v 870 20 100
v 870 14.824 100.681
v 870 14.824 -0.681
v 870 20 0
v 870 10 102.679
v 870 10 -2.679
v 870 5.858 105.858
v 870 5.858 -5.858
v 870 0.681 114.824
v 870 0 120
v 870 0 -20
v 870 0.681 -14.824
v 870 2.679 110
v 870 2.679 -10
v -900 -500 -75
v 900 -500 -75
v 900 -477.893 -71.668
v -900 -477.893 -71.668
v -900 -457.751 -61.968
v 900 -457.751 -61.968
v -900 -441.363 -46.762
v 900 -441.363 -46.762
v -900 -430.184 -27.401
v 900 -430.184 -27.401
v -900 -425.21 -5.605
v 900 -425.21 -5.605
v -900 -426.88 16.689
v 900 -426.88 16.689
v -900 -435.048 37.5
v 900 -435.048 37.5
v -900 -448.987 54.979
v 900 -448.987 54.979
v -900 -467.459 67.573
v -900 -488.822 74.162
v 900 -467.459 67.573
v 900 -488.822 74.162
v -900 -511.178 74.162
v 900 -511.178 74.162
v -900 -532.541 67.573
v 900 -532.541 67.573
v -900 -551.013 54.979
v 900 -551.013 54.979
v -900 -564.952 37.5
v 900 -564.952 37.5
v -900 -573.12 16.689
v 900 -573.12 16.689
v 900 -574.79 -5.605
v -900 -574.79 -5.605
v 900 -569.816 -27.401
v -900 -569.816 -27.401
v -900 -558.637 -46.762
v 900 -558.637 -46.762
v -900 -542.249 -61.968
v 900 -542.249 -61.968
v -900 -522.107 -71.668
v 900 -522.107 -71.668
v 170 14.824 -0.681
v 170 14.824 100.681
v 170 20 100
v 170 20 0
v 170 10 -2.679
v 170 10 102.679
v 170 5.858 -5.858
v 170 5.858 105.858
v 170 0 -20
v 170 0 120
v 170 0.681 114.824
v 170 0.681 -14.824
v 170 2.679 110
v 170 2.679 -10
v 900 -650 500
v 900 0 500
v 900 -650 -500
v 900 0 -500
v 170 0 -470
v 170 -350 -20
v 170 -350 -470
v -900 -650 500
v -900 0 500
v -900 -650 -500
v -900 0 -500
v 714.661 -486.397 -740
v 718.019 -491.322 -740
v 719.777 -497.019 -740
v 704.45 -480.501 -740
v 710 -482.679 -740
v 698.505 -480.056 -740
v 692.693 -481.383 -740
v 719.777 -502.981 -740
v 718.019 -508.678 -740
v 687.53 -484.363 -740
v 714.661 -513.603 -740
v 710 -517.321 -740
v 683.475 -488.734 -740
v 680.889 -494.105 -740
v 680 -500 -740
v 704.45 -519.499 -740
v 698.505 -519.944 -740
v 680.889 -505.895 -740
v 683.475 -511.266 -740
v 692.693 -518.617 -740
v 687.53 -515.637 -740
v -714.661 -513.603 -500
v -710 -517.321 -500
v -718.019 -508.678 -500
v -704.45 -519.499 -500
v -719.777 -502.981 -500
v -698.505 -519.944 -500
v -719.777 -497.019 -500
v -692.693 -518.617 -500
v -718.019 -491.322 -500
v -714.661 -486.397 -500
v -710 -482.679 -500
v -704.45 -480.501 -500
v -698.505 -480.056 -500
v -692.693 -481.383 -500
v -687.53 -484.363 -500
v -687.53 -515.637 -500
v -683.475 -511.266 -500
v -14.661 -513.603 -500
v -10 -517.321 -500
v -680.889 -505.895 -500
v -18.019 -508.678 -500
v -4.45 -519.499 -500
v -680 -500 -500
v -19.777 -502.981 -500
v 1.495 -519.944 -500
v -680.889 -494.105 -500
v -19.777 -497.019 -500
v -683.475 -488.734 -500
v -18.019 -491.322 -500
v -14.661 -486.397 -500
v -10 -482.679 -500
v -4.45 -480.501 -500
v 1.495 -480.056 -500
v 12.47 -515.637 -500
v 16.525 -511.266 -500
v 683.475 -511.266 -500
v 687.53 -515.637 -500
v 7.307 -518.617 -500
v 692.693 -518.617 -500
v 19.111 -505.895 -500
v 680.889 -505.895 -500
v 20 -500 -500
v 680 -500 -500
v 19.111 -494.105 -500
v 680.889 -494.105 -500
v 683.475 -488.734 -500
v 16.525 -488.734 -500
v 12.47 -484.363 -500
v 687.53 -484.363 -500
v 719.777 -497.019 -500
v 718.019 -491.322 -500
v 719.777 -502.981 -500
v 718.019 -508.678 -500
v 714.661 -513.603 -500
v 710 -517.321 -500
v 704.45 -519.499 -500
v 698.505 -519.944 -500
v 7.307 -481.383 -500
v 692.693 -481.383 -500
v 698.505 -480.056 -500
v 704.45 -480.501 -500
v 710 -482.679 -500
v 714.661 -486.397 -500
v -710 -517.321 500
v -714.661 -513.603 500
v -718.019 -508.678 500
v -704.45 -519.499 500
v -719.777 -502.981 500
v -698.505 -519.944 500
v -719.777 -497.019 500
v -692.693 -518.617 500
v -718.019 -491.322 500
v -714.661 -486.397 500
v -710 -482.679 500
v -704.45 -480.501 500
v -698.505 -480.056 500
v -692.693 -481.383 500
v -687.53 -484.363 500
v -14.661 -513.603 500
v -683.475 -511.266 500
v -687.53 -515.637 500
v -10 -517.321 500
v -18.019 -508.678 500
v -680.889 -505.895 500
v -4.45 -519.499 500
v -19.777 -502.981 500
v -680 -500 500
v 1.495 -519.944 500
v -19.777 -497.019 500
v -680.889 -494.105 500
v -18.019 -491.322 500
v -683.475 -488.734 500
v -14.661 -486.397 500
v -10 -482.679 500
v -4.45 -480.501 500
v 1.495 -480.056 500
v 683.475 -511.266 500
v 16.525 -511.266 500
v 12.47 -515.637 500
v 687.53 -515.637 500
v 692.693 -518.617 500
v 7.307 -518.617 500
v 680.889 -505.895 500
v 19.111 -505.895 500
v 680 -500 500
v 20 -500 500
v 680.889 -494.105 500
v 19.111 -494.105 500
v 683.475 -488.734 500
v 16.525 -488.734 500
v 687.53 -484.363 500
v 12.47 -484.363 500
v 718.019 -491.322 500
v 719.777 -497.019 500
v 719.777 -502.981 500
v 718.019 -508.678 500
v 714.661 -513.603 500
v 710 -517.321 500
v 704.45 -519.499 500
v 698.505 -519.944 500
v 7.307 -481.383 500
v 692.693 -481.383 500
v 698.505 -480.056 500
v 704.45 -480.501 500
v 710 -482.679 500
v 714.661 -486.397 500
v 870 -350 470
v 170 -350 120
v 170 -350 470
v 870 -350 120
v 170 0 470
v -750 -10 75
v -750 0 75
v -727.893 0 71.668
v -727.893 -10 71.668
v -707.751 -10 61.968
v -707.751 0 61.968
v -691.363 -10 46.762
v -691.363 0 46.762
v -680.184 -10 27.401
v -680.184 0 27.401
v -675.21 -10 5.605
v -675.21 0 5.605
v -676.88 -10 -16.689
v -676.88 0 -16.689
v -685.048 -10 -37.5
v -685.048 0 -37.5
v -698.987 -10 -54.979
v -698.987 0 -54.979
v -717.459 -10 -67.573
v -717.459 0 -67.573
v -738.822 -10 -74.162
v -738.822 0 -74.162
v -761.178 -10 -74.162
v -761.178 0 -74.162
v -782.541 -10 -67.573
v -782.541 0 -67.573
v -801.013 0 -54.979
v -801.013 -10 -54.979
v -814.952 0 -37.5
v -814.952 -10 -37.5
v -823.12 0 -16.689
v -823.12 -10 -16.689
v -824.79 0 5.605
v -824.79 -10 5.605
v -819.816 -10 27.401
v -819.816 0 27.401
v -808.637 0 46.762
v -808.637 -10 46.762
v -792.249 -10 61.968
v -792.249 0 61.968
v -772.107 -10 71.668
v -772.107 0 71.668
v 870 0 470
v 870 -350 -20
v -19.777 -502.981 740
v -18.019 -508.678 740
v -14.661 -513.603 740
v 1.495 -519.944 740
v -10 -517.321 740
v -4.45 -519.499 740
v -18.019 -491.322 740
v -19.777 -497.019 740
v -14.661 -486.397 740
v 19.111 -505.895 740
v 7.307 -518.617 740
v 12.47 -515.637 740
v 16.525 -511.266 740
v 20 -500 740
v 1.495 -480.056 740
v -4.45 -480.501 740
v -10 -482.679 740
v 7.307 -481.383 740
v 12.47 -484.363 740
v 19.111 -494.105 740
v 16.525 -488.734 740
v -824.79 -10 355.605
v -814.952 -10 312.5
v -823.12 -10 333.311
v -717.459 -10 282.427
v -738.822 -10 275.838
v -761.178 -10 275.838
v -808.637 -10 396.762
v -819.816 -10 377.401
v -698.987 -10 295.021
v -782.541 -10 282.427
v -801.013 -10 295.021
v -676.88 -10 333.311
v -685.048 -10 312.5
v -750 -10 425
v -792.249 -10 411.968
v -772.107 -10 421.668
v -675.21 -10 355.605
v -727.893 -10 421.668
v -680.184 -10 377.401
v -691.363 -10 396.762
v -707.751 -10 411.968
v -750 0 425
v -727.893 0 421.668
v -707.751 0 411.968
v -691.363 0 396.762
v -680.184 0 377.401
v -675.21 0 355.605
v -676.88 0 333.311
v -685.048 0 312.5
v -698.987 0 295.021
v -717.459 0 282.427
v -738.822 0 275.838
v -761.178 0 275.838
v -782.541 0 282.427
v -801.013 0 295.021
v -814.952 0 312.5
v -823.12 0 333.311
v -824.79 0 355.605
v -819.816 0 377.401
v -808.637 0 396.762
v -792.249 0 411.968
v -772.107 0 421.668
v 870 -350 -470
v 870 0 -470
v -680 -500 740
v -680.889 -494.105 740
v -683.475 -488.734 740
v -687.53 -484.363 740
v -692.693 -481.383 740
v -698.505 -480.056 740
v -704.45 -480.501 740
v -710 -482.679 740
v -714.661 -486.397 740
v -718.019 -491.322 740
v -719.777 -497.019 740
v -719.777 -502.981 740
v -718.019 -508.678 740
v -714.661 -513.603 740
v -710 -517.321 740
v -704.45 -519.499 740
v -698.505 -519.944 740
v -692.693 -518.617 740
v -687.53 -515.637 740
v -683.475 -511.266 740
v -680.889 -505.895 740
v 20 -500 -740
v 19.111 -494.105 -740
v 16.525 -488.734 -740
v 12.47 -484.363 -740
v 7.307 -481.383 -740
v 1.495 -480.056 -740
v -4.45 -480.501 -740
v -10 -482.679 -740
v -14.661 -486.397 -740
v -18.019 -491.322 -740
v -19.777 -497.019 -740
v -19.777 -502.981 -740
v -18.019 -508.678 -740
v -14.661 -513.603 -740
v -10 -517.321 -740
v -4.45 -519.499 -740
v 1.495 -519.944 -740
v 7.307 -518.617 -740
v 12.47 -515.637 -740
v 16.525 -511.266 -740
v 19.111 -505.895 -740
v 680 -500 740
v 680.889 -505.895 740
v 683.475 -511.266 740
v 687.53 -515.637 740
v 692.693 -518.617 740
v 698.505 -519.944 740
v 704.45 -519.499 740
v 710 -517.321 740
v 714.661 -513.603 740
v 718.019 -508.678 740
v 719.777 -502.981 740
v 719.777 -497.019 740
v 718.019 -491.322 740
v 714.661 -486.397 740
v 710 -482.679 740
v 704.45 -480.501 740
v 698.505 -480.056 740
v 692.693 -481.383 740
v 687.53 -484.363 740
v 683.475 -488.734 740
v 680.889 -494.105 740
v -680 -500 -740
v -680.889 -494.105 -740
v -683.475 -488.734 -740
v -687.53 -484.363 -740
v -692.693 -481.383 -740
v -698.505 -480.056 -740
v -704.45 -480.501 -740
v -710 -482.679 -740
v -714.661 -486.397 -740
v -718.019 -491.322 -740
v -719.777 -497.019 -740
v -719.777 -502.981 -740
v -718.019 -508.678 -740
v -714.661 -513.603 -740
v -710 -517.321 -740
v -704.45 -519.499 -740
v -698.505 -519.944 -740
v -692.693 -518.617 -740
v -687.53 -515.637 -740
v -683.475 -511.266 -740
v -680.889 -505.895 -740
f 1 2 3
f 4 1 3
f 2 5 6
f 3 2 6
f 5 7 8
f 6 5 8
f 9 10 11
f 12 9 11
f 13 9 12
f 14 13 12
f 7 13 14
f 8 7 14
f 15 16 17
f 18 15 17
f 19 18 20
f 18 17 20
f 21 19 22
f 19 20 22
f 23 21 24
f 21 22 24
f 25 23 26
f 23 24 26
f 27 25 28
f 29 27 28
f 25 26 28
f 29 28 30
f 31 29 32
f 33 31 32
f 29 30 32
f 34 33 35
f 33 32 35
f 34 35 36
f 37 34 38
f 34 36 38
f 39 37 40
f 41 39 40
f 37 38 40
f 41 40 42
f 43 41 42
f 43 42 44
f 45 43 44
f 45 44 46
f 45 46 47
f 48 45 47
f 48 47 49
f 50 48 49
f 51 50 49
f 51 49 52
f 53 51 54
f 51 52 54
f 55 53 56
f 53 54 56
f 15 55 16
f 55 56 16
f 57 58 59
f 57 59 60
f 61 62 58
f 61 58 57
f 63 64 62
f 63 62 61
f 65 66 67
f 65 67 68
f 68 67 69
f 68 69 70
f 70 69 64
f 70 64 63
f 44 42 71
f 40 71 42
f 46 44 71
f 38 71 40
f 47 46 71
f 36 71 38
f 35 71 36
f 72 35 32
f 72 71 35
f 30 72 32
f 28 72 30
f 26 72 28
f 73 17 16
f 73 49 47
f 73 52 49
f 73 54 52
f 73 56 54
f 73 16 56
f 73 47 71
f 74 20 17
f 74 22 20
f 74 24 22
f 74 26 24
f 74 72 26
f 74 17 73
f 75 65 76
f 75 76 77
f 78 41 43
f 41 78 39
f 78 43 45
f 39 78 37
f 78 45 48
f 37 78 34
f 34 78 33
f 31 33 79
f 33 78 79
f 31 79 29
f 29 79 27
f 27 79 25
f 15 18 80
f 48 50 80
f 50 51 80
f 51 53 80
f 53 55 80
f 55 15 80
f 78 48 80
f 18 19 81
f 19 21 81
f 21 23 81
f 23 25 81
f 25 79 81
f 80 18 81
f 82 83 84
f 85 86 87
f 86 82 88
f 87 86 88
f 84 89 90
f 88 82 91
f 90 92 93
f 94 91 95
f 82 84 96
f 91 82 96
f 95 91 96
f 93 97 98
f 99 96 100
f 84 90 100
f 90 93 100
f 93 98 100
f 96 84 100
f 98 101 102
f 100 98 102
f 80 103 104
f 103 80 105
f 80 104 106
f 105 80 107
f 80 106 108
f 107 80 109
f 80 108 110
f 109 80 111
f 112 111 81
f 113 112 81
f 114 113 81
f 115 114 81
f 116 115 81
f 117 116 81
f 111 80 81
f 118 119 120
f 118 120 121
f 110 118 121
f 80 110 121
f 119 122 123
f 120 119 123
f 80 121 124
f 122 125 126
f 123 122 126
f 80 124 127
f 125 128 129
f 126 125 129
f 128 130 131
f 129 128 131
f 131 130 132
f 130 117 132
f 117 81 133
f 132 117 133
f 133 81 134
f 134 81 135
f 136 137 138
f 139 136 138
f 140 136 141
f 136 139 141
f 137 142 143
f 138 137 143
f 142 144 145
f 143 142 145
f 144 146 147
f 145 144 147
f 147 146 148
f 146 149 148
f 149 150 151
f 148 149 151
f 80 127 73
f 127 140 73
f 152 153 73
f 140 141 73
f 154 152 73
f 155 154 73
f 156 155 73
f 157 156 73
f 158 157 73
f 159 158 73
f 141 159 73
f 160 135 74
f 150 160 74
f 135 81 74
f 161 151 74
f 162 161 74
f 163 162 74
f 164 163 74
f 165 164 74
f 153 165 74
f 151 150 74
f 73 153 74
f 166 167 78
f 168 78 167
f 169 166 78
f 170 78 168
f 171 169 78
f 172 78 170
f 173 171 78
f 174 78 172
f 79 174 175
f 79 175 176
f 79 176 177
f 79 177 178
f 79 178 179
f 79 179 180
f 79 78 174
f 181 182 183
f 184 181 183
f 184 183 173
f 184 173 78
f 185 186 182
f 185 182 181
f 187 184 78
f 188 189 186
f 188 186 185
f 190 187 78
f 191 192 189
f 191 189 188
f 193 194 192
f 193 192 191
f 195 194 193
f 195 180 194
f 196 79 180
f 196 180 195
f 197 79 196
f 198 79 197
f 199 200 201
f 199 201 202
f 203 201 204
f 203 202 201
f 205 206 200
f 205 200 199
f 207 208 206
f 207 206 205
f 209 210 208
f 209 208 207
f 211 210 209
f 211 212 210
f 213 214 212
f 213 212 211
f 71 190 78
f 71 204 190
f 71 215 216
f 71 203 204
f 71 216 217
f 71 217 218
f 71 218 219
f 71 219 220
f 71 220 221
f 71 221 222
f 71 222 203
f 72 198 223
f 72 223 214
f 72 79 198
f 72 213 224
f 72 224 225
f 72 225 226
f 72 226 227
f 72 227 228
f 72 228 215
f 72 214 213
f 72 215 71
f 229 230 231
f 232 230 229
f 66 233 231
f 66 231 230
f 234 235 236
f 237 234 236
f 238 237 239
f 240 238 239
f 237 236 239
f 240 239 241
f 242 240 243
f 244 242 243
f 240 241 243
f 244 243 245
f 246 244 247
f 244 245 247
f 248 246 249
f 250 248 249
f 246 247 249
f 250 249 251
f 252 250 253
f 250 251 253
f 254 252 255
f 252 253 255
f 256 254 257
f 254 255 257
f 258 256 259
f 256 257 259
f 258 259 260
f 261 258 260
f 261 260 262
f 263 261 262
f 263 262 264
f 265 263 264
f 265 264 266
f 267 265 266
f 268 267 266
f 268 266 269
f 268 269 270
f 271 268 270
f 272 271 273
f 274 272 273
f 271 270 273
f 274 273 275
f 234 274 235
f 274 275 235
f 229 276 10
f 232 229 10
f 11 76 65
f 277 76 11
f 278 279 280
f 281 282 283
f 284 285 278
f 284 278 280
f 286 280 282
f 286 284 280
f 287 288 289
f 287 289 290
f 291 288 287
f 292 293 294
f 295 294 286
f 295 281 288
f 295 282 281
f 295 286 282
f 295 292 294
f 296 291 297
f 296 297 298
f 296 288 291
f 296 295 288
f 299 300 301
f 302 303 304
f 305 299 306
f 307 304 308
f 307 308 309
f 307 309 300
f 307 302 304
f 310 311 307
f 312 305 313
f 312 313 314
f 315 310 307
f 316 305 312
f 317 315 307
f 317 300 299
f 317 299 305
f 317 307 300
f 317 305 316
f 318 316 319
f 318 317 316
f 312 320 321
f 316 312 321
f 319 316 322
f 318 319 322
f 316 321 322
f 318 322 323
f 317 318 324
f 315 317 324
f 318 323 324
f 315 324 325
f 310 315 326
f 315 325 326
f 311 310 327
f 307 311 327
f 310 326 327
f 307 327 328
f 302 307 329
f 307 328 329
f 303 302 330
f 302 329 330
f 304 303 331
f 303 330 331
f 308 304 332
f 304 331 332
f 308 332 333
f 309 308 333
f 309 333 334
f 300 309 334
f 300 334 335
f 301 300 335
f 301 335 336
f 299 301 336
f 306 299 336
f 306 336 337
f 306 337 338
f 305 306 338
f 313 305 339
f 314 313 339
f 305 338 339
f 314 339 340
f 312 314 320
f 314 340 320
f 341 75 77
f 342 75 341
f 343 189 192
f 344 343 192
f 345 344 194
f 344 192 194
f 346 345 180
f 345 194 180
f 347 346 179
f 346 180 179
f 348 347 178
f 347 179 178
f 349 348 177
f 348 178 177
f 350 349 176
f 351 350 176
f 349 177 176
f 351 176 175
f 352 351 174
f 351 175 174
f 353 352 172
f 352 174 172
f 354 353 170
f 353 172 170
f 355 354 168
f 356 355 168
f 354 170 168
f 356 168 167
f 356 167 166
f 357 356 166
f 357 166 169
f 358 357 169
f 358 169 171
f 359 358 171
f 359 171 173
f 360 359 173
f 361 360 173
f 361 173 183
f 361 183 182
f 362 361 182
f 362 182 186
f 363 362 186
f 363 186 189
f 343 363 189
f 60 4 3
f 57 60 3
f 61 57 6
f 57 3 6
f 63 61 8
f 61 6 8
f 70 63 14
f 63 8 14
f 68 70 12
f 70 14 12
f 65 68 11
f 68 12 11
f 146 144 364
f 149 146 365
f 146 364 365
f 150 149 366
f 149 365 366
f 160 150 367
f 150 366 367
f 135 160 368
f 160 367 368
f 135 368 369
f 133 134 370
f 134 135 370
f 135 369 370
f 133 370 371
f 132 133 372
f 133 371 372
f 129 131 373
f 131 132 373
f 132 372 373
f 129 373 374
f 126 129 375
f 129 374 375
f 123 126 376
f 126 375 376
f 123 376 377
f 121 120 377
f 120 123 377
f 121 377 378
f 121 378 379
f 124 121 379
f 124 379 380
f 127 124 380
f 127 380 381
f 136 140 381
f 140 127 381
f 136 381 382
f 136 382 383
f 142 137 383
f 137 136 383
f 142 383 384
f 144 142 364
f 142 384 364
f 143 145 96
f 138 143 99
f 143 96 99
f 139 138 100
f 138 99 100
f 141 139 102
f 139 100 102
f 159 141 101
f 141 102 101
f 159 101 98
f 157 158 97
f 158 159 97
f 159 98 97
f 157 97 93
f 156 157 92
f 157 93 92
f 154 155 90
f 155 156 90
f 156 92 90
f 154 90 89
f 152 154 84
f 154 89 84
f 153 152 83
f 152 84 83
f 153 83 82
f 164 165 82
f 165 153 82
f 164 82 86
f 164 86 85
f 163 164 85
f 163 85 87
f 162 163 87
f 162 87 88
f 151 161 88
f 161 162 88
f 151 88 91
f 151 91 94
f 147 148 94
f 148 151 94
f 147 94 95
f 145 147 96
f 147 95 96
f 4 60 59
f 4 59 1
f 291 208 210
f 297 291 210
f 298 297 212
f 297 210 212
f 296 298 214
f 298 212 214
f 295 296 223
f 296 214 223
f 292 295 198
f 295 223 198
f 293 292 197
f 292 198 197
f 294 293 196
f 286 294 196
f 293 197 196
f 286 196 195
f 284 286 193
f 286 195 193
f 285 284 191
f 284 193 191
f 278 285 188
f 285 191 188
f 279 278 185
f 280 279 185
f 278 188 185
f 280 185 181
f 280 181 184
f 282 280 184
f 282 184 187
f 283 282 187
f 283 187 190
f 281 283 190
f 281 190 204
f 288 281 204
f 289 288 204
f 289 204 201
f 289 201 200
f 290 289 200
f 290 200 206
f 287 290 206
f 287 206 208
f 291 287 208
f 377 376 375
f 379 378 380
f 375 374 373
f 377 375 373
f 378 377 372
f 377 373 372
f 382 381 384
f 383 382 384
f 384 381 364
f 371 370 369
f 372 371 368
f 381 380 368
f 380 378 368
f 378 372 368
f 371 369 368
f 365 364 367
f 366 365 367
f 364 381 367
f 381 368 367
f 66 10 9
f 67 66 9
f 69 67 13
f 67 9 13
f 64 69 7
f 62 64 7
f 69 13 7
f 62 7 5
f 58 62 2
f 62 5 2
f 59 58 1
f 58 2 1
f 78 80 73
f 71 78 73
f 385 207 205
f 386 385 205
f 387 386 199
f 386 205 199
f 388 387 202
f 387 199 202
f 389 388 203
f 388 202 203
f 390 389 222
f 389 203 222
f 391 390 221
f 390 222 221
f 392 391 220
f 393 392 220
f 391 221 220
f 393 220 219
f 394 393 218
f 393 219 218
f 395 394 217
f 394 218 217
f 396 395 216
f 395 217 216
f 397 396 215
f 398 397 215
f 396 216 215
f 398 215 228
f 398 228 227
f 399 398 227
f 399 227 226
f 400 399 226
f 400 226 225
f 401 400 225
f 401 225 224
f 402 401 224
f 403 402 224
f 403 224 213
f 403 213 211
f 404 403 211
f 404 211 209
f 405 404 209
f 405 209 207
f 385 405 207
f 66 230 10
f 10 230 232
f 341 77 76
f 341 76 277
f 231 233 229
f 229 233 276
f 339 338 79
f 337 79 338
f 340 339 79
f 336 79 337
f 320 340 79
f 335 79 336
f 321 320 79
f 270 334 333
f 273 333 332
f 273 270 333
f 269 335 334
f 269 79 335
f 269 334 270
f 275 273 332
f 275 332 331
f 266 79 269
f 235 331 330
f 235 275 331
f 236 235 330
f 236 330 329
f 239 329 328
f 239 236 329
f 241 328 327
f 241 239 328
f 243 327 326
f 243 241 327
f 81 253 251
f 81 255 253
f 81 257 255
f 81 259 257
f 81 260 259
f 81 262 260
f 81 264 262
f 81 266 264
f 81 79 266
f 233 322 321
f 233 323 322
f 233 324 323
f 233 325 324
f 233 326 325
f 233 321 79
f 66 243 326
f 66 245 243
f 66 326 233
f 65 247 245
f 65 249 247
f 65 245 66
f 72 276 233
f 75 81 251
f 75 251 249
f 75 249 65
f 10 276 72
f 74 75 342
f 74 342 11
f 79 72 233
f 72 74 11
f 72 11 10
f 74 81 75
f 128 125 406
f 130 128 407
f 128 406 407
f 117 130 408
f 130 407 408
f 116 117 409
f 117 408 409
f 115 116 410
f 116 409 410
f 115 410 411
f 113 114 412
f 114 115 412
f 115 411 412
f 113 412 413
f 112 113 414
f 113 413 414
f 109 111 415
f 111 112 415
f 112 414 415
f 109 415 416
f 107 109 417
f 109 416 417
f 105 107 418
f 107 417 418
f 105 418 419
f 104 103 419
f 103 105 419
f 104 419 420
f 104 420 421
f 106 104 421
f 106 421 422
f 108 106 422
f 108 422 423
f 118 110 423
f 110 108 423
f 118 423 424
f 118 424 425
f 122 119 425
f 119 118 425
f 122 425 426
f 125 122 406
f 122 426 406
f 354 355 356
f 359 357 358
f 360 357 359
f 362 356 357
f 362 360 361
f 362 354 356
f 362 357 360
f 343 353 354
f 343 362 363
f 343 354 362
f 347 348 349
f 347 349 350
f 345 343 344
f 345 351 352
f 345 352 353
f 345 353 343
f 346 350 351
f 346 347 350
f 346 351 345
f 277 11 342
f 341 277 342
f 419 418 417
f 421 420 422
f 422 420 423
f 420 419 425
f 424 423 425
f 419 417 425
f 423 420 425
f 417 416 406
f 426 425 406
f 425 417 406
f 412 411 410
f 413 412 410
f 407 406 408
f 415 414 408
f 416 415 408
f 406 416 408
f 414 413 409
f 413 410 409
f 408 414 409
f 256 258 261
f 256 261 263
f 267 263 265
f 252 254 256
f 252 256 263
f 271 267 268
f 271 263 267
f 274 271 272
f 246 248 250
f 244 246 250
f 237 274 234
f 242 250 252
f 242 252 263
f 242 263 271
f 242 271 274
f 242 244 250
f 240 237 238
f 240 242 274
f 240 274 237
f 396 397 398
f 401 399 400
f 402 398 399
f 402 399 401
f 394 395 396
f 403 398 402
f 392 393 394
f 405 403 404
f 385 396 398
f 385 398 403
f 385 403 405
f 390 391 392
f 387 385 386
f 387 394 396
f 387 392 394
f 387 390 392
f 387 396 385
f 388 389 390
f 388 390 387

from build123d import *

# Parameters (mm, degrees)
SKIZZE1_W                            = 1800
SKIZZE1_H                            = 1000
AUFSATZ_LINEAR_AUSTRAGEN1_DEPTH      = 650
AUFSATZ_LINEAR_AUSTRAGEN2_DEPTH      = 740
AUFSATZ_LINEAR_AUSTRAGEN2_DEPTH_BACK = 740
SKIZZE2_R                            = 20
SKIZZE3_W                            = 700
SKIZZE3_H                            = 450
SKIZZE3_H_2                          = 350
SCHNITT_LINEAR_AUSTRAGEN1_DEPTH      = 350
SKIZZE4_W                            = 700
SKIZZE4_H                            = 140
AUFSATZ_LINEAR_AUSTRAGEN3_DEPTH      = 20
SKIZZE5_R                            = 20
SCHNITT_LINEAR_AUSTRAGEN2_DEPTH      = 700
SKIZZE6_R                            = 75
SCHNITT_LINEAR_AUSTRAGEN3_DEPTH      = 1800
SKIZZE7_R                            = 75
SCHNITT_LINEAR_AUSTRAGEN4_DEPTH      = 10
SKIZZE8_R                            = 75
SCHNITT_LINEAR_AUSTRAGEN5_DEPTH      = 10


with BuildPart() as part:
    # Skizze1 → Aufsatz-Linear austragen1 (new body)
    with BuildSketch(Plane(origin=(0, 0, 0), x_dir=(1, 0, 0), z_dir=(0, 1, 0))):
        Rectangle(SKIZZE1_W, SKIZZE1_H)
    extrude(amount=-AUFSATZ_LINEAR_AUSTRAGEN1_DEPTH)

    # Skizze2 → Aufsatz-Linear austragen2 (add, two sides: drawn at the far end of the back side and taken through both)
    with BuildSketch(Plane.XY.offset(-AUFSATZ_LINEAR_AUSTRAGEN2_DEPTH_BACK)):
        with Locations((0, -500)):
            Circle(SKIZZE2_R)
        with Locations((-700, -500)):
            Circle(SKIZZE2_R)
        with Locations(Location((700, -500, 0), (0, 0, 180))):
            Circle(SKIZZE2_R)
    extrude(amount=AUFSATZ_LINEAR_AUSTRAGEN2_DEPTH + AUFSATZ_LINEAR_AUSTRAGEN2_DEPTH_BACK)

    # Skizze3 → Schnitt-Linear austragen1 (cut)
    with BuildSketch(Plane(origin=(0, 0, 0), x_dir=(1, 0, 0), z_dir=(0, 1, 0))):
        with Locations((520, 245)):
            Rectangle(SKIZZE3_W, SKIZZE3_H)
        with Locations((520, -295)):
            Rectangle(SKIZZE3_W, SKIZZE3_H_2)
    extrude(amount=-SCHNITT_LINEAR_AUSTRAGEN1_DEPTH, mode=Mode.SUBTRACT)

    # Skizze4 → Aufsatz-Linear austragen3 (add)
    with BuildSketch(Plane(origin=(0, 0, 0), x_dir=(1, 0, 0), z_dir=(0, 1, 0))):
        with Locations((520, -50)):
            Rectangle(SKIZZE4_W, SKIZZE4_H)
    extrude(amount=AUFSATZ_LINEAR_AUSTRAGEN3_DEPTH)

    # Skizze5 → Schnitt-Linear austragen2 (cut)
    with BuildSketch(Plane(origin=(870, 0, 0), x_dir=(0, 0, -1), z_dir=(1, 0, 0))):
        with Locations((-120, 20)):
            Circle(SKIZZE5_R)
        with Locations((20, 20)):
            Circle(SKIZZE5_R)
    extrude(amount=-SCHNITT_LINEAR_AUSTRAGEN2_DEPTH, mode=Mode.SUBTRACT)

    # Skizze6 → Schnitt-Linear austragen3 (cut)
    with BuildSketch(Plane(origin=(900, 0, 0), x_dir=(0, 0, -1), z_dir=(1, 0, 0))):
        with Locations((0, -500)):
            Circle(SKIZZE6_R)
    extrude(amount=-SCHNITT_LINEAR_AUSTRAGEN3_DEPTH, mode=Mode.SUBTRACT)

    # Skizze7 → Schnitt-Linear austragen4 (cut)
    with BuildSketch(Plane(origin=(0, 0, 0), x_dir=(1, 0, 0), z_dir=(0, 1, 0))):
        with Locations(Location((-750, -350, 0), (0, 0, 270))):
            Circle(SKIZZE7_R)
    extrude(amount=-SCHNITT_LINEAR_AUSTRAGEN4_DEPTH, mode=Mode.SUBTRACT)

    # Skizze8 → Schnitt-Linear austragen5 (cut)
    with BuildSketch(Plane(origin=(0, 0, 0), x_dir=(1, 0, 0), z_dir=(0, 1, 0))):
        with Locations(Location((-750, 0, 0), (0, 0, 270))):
            Circle(SKIZZE8_R)
    extrude(amount=-SCHNITT_LINEAR_AUSTRAGEN5_DEPTH, mode=Mode.SUBTRACT)


solid = part.part
